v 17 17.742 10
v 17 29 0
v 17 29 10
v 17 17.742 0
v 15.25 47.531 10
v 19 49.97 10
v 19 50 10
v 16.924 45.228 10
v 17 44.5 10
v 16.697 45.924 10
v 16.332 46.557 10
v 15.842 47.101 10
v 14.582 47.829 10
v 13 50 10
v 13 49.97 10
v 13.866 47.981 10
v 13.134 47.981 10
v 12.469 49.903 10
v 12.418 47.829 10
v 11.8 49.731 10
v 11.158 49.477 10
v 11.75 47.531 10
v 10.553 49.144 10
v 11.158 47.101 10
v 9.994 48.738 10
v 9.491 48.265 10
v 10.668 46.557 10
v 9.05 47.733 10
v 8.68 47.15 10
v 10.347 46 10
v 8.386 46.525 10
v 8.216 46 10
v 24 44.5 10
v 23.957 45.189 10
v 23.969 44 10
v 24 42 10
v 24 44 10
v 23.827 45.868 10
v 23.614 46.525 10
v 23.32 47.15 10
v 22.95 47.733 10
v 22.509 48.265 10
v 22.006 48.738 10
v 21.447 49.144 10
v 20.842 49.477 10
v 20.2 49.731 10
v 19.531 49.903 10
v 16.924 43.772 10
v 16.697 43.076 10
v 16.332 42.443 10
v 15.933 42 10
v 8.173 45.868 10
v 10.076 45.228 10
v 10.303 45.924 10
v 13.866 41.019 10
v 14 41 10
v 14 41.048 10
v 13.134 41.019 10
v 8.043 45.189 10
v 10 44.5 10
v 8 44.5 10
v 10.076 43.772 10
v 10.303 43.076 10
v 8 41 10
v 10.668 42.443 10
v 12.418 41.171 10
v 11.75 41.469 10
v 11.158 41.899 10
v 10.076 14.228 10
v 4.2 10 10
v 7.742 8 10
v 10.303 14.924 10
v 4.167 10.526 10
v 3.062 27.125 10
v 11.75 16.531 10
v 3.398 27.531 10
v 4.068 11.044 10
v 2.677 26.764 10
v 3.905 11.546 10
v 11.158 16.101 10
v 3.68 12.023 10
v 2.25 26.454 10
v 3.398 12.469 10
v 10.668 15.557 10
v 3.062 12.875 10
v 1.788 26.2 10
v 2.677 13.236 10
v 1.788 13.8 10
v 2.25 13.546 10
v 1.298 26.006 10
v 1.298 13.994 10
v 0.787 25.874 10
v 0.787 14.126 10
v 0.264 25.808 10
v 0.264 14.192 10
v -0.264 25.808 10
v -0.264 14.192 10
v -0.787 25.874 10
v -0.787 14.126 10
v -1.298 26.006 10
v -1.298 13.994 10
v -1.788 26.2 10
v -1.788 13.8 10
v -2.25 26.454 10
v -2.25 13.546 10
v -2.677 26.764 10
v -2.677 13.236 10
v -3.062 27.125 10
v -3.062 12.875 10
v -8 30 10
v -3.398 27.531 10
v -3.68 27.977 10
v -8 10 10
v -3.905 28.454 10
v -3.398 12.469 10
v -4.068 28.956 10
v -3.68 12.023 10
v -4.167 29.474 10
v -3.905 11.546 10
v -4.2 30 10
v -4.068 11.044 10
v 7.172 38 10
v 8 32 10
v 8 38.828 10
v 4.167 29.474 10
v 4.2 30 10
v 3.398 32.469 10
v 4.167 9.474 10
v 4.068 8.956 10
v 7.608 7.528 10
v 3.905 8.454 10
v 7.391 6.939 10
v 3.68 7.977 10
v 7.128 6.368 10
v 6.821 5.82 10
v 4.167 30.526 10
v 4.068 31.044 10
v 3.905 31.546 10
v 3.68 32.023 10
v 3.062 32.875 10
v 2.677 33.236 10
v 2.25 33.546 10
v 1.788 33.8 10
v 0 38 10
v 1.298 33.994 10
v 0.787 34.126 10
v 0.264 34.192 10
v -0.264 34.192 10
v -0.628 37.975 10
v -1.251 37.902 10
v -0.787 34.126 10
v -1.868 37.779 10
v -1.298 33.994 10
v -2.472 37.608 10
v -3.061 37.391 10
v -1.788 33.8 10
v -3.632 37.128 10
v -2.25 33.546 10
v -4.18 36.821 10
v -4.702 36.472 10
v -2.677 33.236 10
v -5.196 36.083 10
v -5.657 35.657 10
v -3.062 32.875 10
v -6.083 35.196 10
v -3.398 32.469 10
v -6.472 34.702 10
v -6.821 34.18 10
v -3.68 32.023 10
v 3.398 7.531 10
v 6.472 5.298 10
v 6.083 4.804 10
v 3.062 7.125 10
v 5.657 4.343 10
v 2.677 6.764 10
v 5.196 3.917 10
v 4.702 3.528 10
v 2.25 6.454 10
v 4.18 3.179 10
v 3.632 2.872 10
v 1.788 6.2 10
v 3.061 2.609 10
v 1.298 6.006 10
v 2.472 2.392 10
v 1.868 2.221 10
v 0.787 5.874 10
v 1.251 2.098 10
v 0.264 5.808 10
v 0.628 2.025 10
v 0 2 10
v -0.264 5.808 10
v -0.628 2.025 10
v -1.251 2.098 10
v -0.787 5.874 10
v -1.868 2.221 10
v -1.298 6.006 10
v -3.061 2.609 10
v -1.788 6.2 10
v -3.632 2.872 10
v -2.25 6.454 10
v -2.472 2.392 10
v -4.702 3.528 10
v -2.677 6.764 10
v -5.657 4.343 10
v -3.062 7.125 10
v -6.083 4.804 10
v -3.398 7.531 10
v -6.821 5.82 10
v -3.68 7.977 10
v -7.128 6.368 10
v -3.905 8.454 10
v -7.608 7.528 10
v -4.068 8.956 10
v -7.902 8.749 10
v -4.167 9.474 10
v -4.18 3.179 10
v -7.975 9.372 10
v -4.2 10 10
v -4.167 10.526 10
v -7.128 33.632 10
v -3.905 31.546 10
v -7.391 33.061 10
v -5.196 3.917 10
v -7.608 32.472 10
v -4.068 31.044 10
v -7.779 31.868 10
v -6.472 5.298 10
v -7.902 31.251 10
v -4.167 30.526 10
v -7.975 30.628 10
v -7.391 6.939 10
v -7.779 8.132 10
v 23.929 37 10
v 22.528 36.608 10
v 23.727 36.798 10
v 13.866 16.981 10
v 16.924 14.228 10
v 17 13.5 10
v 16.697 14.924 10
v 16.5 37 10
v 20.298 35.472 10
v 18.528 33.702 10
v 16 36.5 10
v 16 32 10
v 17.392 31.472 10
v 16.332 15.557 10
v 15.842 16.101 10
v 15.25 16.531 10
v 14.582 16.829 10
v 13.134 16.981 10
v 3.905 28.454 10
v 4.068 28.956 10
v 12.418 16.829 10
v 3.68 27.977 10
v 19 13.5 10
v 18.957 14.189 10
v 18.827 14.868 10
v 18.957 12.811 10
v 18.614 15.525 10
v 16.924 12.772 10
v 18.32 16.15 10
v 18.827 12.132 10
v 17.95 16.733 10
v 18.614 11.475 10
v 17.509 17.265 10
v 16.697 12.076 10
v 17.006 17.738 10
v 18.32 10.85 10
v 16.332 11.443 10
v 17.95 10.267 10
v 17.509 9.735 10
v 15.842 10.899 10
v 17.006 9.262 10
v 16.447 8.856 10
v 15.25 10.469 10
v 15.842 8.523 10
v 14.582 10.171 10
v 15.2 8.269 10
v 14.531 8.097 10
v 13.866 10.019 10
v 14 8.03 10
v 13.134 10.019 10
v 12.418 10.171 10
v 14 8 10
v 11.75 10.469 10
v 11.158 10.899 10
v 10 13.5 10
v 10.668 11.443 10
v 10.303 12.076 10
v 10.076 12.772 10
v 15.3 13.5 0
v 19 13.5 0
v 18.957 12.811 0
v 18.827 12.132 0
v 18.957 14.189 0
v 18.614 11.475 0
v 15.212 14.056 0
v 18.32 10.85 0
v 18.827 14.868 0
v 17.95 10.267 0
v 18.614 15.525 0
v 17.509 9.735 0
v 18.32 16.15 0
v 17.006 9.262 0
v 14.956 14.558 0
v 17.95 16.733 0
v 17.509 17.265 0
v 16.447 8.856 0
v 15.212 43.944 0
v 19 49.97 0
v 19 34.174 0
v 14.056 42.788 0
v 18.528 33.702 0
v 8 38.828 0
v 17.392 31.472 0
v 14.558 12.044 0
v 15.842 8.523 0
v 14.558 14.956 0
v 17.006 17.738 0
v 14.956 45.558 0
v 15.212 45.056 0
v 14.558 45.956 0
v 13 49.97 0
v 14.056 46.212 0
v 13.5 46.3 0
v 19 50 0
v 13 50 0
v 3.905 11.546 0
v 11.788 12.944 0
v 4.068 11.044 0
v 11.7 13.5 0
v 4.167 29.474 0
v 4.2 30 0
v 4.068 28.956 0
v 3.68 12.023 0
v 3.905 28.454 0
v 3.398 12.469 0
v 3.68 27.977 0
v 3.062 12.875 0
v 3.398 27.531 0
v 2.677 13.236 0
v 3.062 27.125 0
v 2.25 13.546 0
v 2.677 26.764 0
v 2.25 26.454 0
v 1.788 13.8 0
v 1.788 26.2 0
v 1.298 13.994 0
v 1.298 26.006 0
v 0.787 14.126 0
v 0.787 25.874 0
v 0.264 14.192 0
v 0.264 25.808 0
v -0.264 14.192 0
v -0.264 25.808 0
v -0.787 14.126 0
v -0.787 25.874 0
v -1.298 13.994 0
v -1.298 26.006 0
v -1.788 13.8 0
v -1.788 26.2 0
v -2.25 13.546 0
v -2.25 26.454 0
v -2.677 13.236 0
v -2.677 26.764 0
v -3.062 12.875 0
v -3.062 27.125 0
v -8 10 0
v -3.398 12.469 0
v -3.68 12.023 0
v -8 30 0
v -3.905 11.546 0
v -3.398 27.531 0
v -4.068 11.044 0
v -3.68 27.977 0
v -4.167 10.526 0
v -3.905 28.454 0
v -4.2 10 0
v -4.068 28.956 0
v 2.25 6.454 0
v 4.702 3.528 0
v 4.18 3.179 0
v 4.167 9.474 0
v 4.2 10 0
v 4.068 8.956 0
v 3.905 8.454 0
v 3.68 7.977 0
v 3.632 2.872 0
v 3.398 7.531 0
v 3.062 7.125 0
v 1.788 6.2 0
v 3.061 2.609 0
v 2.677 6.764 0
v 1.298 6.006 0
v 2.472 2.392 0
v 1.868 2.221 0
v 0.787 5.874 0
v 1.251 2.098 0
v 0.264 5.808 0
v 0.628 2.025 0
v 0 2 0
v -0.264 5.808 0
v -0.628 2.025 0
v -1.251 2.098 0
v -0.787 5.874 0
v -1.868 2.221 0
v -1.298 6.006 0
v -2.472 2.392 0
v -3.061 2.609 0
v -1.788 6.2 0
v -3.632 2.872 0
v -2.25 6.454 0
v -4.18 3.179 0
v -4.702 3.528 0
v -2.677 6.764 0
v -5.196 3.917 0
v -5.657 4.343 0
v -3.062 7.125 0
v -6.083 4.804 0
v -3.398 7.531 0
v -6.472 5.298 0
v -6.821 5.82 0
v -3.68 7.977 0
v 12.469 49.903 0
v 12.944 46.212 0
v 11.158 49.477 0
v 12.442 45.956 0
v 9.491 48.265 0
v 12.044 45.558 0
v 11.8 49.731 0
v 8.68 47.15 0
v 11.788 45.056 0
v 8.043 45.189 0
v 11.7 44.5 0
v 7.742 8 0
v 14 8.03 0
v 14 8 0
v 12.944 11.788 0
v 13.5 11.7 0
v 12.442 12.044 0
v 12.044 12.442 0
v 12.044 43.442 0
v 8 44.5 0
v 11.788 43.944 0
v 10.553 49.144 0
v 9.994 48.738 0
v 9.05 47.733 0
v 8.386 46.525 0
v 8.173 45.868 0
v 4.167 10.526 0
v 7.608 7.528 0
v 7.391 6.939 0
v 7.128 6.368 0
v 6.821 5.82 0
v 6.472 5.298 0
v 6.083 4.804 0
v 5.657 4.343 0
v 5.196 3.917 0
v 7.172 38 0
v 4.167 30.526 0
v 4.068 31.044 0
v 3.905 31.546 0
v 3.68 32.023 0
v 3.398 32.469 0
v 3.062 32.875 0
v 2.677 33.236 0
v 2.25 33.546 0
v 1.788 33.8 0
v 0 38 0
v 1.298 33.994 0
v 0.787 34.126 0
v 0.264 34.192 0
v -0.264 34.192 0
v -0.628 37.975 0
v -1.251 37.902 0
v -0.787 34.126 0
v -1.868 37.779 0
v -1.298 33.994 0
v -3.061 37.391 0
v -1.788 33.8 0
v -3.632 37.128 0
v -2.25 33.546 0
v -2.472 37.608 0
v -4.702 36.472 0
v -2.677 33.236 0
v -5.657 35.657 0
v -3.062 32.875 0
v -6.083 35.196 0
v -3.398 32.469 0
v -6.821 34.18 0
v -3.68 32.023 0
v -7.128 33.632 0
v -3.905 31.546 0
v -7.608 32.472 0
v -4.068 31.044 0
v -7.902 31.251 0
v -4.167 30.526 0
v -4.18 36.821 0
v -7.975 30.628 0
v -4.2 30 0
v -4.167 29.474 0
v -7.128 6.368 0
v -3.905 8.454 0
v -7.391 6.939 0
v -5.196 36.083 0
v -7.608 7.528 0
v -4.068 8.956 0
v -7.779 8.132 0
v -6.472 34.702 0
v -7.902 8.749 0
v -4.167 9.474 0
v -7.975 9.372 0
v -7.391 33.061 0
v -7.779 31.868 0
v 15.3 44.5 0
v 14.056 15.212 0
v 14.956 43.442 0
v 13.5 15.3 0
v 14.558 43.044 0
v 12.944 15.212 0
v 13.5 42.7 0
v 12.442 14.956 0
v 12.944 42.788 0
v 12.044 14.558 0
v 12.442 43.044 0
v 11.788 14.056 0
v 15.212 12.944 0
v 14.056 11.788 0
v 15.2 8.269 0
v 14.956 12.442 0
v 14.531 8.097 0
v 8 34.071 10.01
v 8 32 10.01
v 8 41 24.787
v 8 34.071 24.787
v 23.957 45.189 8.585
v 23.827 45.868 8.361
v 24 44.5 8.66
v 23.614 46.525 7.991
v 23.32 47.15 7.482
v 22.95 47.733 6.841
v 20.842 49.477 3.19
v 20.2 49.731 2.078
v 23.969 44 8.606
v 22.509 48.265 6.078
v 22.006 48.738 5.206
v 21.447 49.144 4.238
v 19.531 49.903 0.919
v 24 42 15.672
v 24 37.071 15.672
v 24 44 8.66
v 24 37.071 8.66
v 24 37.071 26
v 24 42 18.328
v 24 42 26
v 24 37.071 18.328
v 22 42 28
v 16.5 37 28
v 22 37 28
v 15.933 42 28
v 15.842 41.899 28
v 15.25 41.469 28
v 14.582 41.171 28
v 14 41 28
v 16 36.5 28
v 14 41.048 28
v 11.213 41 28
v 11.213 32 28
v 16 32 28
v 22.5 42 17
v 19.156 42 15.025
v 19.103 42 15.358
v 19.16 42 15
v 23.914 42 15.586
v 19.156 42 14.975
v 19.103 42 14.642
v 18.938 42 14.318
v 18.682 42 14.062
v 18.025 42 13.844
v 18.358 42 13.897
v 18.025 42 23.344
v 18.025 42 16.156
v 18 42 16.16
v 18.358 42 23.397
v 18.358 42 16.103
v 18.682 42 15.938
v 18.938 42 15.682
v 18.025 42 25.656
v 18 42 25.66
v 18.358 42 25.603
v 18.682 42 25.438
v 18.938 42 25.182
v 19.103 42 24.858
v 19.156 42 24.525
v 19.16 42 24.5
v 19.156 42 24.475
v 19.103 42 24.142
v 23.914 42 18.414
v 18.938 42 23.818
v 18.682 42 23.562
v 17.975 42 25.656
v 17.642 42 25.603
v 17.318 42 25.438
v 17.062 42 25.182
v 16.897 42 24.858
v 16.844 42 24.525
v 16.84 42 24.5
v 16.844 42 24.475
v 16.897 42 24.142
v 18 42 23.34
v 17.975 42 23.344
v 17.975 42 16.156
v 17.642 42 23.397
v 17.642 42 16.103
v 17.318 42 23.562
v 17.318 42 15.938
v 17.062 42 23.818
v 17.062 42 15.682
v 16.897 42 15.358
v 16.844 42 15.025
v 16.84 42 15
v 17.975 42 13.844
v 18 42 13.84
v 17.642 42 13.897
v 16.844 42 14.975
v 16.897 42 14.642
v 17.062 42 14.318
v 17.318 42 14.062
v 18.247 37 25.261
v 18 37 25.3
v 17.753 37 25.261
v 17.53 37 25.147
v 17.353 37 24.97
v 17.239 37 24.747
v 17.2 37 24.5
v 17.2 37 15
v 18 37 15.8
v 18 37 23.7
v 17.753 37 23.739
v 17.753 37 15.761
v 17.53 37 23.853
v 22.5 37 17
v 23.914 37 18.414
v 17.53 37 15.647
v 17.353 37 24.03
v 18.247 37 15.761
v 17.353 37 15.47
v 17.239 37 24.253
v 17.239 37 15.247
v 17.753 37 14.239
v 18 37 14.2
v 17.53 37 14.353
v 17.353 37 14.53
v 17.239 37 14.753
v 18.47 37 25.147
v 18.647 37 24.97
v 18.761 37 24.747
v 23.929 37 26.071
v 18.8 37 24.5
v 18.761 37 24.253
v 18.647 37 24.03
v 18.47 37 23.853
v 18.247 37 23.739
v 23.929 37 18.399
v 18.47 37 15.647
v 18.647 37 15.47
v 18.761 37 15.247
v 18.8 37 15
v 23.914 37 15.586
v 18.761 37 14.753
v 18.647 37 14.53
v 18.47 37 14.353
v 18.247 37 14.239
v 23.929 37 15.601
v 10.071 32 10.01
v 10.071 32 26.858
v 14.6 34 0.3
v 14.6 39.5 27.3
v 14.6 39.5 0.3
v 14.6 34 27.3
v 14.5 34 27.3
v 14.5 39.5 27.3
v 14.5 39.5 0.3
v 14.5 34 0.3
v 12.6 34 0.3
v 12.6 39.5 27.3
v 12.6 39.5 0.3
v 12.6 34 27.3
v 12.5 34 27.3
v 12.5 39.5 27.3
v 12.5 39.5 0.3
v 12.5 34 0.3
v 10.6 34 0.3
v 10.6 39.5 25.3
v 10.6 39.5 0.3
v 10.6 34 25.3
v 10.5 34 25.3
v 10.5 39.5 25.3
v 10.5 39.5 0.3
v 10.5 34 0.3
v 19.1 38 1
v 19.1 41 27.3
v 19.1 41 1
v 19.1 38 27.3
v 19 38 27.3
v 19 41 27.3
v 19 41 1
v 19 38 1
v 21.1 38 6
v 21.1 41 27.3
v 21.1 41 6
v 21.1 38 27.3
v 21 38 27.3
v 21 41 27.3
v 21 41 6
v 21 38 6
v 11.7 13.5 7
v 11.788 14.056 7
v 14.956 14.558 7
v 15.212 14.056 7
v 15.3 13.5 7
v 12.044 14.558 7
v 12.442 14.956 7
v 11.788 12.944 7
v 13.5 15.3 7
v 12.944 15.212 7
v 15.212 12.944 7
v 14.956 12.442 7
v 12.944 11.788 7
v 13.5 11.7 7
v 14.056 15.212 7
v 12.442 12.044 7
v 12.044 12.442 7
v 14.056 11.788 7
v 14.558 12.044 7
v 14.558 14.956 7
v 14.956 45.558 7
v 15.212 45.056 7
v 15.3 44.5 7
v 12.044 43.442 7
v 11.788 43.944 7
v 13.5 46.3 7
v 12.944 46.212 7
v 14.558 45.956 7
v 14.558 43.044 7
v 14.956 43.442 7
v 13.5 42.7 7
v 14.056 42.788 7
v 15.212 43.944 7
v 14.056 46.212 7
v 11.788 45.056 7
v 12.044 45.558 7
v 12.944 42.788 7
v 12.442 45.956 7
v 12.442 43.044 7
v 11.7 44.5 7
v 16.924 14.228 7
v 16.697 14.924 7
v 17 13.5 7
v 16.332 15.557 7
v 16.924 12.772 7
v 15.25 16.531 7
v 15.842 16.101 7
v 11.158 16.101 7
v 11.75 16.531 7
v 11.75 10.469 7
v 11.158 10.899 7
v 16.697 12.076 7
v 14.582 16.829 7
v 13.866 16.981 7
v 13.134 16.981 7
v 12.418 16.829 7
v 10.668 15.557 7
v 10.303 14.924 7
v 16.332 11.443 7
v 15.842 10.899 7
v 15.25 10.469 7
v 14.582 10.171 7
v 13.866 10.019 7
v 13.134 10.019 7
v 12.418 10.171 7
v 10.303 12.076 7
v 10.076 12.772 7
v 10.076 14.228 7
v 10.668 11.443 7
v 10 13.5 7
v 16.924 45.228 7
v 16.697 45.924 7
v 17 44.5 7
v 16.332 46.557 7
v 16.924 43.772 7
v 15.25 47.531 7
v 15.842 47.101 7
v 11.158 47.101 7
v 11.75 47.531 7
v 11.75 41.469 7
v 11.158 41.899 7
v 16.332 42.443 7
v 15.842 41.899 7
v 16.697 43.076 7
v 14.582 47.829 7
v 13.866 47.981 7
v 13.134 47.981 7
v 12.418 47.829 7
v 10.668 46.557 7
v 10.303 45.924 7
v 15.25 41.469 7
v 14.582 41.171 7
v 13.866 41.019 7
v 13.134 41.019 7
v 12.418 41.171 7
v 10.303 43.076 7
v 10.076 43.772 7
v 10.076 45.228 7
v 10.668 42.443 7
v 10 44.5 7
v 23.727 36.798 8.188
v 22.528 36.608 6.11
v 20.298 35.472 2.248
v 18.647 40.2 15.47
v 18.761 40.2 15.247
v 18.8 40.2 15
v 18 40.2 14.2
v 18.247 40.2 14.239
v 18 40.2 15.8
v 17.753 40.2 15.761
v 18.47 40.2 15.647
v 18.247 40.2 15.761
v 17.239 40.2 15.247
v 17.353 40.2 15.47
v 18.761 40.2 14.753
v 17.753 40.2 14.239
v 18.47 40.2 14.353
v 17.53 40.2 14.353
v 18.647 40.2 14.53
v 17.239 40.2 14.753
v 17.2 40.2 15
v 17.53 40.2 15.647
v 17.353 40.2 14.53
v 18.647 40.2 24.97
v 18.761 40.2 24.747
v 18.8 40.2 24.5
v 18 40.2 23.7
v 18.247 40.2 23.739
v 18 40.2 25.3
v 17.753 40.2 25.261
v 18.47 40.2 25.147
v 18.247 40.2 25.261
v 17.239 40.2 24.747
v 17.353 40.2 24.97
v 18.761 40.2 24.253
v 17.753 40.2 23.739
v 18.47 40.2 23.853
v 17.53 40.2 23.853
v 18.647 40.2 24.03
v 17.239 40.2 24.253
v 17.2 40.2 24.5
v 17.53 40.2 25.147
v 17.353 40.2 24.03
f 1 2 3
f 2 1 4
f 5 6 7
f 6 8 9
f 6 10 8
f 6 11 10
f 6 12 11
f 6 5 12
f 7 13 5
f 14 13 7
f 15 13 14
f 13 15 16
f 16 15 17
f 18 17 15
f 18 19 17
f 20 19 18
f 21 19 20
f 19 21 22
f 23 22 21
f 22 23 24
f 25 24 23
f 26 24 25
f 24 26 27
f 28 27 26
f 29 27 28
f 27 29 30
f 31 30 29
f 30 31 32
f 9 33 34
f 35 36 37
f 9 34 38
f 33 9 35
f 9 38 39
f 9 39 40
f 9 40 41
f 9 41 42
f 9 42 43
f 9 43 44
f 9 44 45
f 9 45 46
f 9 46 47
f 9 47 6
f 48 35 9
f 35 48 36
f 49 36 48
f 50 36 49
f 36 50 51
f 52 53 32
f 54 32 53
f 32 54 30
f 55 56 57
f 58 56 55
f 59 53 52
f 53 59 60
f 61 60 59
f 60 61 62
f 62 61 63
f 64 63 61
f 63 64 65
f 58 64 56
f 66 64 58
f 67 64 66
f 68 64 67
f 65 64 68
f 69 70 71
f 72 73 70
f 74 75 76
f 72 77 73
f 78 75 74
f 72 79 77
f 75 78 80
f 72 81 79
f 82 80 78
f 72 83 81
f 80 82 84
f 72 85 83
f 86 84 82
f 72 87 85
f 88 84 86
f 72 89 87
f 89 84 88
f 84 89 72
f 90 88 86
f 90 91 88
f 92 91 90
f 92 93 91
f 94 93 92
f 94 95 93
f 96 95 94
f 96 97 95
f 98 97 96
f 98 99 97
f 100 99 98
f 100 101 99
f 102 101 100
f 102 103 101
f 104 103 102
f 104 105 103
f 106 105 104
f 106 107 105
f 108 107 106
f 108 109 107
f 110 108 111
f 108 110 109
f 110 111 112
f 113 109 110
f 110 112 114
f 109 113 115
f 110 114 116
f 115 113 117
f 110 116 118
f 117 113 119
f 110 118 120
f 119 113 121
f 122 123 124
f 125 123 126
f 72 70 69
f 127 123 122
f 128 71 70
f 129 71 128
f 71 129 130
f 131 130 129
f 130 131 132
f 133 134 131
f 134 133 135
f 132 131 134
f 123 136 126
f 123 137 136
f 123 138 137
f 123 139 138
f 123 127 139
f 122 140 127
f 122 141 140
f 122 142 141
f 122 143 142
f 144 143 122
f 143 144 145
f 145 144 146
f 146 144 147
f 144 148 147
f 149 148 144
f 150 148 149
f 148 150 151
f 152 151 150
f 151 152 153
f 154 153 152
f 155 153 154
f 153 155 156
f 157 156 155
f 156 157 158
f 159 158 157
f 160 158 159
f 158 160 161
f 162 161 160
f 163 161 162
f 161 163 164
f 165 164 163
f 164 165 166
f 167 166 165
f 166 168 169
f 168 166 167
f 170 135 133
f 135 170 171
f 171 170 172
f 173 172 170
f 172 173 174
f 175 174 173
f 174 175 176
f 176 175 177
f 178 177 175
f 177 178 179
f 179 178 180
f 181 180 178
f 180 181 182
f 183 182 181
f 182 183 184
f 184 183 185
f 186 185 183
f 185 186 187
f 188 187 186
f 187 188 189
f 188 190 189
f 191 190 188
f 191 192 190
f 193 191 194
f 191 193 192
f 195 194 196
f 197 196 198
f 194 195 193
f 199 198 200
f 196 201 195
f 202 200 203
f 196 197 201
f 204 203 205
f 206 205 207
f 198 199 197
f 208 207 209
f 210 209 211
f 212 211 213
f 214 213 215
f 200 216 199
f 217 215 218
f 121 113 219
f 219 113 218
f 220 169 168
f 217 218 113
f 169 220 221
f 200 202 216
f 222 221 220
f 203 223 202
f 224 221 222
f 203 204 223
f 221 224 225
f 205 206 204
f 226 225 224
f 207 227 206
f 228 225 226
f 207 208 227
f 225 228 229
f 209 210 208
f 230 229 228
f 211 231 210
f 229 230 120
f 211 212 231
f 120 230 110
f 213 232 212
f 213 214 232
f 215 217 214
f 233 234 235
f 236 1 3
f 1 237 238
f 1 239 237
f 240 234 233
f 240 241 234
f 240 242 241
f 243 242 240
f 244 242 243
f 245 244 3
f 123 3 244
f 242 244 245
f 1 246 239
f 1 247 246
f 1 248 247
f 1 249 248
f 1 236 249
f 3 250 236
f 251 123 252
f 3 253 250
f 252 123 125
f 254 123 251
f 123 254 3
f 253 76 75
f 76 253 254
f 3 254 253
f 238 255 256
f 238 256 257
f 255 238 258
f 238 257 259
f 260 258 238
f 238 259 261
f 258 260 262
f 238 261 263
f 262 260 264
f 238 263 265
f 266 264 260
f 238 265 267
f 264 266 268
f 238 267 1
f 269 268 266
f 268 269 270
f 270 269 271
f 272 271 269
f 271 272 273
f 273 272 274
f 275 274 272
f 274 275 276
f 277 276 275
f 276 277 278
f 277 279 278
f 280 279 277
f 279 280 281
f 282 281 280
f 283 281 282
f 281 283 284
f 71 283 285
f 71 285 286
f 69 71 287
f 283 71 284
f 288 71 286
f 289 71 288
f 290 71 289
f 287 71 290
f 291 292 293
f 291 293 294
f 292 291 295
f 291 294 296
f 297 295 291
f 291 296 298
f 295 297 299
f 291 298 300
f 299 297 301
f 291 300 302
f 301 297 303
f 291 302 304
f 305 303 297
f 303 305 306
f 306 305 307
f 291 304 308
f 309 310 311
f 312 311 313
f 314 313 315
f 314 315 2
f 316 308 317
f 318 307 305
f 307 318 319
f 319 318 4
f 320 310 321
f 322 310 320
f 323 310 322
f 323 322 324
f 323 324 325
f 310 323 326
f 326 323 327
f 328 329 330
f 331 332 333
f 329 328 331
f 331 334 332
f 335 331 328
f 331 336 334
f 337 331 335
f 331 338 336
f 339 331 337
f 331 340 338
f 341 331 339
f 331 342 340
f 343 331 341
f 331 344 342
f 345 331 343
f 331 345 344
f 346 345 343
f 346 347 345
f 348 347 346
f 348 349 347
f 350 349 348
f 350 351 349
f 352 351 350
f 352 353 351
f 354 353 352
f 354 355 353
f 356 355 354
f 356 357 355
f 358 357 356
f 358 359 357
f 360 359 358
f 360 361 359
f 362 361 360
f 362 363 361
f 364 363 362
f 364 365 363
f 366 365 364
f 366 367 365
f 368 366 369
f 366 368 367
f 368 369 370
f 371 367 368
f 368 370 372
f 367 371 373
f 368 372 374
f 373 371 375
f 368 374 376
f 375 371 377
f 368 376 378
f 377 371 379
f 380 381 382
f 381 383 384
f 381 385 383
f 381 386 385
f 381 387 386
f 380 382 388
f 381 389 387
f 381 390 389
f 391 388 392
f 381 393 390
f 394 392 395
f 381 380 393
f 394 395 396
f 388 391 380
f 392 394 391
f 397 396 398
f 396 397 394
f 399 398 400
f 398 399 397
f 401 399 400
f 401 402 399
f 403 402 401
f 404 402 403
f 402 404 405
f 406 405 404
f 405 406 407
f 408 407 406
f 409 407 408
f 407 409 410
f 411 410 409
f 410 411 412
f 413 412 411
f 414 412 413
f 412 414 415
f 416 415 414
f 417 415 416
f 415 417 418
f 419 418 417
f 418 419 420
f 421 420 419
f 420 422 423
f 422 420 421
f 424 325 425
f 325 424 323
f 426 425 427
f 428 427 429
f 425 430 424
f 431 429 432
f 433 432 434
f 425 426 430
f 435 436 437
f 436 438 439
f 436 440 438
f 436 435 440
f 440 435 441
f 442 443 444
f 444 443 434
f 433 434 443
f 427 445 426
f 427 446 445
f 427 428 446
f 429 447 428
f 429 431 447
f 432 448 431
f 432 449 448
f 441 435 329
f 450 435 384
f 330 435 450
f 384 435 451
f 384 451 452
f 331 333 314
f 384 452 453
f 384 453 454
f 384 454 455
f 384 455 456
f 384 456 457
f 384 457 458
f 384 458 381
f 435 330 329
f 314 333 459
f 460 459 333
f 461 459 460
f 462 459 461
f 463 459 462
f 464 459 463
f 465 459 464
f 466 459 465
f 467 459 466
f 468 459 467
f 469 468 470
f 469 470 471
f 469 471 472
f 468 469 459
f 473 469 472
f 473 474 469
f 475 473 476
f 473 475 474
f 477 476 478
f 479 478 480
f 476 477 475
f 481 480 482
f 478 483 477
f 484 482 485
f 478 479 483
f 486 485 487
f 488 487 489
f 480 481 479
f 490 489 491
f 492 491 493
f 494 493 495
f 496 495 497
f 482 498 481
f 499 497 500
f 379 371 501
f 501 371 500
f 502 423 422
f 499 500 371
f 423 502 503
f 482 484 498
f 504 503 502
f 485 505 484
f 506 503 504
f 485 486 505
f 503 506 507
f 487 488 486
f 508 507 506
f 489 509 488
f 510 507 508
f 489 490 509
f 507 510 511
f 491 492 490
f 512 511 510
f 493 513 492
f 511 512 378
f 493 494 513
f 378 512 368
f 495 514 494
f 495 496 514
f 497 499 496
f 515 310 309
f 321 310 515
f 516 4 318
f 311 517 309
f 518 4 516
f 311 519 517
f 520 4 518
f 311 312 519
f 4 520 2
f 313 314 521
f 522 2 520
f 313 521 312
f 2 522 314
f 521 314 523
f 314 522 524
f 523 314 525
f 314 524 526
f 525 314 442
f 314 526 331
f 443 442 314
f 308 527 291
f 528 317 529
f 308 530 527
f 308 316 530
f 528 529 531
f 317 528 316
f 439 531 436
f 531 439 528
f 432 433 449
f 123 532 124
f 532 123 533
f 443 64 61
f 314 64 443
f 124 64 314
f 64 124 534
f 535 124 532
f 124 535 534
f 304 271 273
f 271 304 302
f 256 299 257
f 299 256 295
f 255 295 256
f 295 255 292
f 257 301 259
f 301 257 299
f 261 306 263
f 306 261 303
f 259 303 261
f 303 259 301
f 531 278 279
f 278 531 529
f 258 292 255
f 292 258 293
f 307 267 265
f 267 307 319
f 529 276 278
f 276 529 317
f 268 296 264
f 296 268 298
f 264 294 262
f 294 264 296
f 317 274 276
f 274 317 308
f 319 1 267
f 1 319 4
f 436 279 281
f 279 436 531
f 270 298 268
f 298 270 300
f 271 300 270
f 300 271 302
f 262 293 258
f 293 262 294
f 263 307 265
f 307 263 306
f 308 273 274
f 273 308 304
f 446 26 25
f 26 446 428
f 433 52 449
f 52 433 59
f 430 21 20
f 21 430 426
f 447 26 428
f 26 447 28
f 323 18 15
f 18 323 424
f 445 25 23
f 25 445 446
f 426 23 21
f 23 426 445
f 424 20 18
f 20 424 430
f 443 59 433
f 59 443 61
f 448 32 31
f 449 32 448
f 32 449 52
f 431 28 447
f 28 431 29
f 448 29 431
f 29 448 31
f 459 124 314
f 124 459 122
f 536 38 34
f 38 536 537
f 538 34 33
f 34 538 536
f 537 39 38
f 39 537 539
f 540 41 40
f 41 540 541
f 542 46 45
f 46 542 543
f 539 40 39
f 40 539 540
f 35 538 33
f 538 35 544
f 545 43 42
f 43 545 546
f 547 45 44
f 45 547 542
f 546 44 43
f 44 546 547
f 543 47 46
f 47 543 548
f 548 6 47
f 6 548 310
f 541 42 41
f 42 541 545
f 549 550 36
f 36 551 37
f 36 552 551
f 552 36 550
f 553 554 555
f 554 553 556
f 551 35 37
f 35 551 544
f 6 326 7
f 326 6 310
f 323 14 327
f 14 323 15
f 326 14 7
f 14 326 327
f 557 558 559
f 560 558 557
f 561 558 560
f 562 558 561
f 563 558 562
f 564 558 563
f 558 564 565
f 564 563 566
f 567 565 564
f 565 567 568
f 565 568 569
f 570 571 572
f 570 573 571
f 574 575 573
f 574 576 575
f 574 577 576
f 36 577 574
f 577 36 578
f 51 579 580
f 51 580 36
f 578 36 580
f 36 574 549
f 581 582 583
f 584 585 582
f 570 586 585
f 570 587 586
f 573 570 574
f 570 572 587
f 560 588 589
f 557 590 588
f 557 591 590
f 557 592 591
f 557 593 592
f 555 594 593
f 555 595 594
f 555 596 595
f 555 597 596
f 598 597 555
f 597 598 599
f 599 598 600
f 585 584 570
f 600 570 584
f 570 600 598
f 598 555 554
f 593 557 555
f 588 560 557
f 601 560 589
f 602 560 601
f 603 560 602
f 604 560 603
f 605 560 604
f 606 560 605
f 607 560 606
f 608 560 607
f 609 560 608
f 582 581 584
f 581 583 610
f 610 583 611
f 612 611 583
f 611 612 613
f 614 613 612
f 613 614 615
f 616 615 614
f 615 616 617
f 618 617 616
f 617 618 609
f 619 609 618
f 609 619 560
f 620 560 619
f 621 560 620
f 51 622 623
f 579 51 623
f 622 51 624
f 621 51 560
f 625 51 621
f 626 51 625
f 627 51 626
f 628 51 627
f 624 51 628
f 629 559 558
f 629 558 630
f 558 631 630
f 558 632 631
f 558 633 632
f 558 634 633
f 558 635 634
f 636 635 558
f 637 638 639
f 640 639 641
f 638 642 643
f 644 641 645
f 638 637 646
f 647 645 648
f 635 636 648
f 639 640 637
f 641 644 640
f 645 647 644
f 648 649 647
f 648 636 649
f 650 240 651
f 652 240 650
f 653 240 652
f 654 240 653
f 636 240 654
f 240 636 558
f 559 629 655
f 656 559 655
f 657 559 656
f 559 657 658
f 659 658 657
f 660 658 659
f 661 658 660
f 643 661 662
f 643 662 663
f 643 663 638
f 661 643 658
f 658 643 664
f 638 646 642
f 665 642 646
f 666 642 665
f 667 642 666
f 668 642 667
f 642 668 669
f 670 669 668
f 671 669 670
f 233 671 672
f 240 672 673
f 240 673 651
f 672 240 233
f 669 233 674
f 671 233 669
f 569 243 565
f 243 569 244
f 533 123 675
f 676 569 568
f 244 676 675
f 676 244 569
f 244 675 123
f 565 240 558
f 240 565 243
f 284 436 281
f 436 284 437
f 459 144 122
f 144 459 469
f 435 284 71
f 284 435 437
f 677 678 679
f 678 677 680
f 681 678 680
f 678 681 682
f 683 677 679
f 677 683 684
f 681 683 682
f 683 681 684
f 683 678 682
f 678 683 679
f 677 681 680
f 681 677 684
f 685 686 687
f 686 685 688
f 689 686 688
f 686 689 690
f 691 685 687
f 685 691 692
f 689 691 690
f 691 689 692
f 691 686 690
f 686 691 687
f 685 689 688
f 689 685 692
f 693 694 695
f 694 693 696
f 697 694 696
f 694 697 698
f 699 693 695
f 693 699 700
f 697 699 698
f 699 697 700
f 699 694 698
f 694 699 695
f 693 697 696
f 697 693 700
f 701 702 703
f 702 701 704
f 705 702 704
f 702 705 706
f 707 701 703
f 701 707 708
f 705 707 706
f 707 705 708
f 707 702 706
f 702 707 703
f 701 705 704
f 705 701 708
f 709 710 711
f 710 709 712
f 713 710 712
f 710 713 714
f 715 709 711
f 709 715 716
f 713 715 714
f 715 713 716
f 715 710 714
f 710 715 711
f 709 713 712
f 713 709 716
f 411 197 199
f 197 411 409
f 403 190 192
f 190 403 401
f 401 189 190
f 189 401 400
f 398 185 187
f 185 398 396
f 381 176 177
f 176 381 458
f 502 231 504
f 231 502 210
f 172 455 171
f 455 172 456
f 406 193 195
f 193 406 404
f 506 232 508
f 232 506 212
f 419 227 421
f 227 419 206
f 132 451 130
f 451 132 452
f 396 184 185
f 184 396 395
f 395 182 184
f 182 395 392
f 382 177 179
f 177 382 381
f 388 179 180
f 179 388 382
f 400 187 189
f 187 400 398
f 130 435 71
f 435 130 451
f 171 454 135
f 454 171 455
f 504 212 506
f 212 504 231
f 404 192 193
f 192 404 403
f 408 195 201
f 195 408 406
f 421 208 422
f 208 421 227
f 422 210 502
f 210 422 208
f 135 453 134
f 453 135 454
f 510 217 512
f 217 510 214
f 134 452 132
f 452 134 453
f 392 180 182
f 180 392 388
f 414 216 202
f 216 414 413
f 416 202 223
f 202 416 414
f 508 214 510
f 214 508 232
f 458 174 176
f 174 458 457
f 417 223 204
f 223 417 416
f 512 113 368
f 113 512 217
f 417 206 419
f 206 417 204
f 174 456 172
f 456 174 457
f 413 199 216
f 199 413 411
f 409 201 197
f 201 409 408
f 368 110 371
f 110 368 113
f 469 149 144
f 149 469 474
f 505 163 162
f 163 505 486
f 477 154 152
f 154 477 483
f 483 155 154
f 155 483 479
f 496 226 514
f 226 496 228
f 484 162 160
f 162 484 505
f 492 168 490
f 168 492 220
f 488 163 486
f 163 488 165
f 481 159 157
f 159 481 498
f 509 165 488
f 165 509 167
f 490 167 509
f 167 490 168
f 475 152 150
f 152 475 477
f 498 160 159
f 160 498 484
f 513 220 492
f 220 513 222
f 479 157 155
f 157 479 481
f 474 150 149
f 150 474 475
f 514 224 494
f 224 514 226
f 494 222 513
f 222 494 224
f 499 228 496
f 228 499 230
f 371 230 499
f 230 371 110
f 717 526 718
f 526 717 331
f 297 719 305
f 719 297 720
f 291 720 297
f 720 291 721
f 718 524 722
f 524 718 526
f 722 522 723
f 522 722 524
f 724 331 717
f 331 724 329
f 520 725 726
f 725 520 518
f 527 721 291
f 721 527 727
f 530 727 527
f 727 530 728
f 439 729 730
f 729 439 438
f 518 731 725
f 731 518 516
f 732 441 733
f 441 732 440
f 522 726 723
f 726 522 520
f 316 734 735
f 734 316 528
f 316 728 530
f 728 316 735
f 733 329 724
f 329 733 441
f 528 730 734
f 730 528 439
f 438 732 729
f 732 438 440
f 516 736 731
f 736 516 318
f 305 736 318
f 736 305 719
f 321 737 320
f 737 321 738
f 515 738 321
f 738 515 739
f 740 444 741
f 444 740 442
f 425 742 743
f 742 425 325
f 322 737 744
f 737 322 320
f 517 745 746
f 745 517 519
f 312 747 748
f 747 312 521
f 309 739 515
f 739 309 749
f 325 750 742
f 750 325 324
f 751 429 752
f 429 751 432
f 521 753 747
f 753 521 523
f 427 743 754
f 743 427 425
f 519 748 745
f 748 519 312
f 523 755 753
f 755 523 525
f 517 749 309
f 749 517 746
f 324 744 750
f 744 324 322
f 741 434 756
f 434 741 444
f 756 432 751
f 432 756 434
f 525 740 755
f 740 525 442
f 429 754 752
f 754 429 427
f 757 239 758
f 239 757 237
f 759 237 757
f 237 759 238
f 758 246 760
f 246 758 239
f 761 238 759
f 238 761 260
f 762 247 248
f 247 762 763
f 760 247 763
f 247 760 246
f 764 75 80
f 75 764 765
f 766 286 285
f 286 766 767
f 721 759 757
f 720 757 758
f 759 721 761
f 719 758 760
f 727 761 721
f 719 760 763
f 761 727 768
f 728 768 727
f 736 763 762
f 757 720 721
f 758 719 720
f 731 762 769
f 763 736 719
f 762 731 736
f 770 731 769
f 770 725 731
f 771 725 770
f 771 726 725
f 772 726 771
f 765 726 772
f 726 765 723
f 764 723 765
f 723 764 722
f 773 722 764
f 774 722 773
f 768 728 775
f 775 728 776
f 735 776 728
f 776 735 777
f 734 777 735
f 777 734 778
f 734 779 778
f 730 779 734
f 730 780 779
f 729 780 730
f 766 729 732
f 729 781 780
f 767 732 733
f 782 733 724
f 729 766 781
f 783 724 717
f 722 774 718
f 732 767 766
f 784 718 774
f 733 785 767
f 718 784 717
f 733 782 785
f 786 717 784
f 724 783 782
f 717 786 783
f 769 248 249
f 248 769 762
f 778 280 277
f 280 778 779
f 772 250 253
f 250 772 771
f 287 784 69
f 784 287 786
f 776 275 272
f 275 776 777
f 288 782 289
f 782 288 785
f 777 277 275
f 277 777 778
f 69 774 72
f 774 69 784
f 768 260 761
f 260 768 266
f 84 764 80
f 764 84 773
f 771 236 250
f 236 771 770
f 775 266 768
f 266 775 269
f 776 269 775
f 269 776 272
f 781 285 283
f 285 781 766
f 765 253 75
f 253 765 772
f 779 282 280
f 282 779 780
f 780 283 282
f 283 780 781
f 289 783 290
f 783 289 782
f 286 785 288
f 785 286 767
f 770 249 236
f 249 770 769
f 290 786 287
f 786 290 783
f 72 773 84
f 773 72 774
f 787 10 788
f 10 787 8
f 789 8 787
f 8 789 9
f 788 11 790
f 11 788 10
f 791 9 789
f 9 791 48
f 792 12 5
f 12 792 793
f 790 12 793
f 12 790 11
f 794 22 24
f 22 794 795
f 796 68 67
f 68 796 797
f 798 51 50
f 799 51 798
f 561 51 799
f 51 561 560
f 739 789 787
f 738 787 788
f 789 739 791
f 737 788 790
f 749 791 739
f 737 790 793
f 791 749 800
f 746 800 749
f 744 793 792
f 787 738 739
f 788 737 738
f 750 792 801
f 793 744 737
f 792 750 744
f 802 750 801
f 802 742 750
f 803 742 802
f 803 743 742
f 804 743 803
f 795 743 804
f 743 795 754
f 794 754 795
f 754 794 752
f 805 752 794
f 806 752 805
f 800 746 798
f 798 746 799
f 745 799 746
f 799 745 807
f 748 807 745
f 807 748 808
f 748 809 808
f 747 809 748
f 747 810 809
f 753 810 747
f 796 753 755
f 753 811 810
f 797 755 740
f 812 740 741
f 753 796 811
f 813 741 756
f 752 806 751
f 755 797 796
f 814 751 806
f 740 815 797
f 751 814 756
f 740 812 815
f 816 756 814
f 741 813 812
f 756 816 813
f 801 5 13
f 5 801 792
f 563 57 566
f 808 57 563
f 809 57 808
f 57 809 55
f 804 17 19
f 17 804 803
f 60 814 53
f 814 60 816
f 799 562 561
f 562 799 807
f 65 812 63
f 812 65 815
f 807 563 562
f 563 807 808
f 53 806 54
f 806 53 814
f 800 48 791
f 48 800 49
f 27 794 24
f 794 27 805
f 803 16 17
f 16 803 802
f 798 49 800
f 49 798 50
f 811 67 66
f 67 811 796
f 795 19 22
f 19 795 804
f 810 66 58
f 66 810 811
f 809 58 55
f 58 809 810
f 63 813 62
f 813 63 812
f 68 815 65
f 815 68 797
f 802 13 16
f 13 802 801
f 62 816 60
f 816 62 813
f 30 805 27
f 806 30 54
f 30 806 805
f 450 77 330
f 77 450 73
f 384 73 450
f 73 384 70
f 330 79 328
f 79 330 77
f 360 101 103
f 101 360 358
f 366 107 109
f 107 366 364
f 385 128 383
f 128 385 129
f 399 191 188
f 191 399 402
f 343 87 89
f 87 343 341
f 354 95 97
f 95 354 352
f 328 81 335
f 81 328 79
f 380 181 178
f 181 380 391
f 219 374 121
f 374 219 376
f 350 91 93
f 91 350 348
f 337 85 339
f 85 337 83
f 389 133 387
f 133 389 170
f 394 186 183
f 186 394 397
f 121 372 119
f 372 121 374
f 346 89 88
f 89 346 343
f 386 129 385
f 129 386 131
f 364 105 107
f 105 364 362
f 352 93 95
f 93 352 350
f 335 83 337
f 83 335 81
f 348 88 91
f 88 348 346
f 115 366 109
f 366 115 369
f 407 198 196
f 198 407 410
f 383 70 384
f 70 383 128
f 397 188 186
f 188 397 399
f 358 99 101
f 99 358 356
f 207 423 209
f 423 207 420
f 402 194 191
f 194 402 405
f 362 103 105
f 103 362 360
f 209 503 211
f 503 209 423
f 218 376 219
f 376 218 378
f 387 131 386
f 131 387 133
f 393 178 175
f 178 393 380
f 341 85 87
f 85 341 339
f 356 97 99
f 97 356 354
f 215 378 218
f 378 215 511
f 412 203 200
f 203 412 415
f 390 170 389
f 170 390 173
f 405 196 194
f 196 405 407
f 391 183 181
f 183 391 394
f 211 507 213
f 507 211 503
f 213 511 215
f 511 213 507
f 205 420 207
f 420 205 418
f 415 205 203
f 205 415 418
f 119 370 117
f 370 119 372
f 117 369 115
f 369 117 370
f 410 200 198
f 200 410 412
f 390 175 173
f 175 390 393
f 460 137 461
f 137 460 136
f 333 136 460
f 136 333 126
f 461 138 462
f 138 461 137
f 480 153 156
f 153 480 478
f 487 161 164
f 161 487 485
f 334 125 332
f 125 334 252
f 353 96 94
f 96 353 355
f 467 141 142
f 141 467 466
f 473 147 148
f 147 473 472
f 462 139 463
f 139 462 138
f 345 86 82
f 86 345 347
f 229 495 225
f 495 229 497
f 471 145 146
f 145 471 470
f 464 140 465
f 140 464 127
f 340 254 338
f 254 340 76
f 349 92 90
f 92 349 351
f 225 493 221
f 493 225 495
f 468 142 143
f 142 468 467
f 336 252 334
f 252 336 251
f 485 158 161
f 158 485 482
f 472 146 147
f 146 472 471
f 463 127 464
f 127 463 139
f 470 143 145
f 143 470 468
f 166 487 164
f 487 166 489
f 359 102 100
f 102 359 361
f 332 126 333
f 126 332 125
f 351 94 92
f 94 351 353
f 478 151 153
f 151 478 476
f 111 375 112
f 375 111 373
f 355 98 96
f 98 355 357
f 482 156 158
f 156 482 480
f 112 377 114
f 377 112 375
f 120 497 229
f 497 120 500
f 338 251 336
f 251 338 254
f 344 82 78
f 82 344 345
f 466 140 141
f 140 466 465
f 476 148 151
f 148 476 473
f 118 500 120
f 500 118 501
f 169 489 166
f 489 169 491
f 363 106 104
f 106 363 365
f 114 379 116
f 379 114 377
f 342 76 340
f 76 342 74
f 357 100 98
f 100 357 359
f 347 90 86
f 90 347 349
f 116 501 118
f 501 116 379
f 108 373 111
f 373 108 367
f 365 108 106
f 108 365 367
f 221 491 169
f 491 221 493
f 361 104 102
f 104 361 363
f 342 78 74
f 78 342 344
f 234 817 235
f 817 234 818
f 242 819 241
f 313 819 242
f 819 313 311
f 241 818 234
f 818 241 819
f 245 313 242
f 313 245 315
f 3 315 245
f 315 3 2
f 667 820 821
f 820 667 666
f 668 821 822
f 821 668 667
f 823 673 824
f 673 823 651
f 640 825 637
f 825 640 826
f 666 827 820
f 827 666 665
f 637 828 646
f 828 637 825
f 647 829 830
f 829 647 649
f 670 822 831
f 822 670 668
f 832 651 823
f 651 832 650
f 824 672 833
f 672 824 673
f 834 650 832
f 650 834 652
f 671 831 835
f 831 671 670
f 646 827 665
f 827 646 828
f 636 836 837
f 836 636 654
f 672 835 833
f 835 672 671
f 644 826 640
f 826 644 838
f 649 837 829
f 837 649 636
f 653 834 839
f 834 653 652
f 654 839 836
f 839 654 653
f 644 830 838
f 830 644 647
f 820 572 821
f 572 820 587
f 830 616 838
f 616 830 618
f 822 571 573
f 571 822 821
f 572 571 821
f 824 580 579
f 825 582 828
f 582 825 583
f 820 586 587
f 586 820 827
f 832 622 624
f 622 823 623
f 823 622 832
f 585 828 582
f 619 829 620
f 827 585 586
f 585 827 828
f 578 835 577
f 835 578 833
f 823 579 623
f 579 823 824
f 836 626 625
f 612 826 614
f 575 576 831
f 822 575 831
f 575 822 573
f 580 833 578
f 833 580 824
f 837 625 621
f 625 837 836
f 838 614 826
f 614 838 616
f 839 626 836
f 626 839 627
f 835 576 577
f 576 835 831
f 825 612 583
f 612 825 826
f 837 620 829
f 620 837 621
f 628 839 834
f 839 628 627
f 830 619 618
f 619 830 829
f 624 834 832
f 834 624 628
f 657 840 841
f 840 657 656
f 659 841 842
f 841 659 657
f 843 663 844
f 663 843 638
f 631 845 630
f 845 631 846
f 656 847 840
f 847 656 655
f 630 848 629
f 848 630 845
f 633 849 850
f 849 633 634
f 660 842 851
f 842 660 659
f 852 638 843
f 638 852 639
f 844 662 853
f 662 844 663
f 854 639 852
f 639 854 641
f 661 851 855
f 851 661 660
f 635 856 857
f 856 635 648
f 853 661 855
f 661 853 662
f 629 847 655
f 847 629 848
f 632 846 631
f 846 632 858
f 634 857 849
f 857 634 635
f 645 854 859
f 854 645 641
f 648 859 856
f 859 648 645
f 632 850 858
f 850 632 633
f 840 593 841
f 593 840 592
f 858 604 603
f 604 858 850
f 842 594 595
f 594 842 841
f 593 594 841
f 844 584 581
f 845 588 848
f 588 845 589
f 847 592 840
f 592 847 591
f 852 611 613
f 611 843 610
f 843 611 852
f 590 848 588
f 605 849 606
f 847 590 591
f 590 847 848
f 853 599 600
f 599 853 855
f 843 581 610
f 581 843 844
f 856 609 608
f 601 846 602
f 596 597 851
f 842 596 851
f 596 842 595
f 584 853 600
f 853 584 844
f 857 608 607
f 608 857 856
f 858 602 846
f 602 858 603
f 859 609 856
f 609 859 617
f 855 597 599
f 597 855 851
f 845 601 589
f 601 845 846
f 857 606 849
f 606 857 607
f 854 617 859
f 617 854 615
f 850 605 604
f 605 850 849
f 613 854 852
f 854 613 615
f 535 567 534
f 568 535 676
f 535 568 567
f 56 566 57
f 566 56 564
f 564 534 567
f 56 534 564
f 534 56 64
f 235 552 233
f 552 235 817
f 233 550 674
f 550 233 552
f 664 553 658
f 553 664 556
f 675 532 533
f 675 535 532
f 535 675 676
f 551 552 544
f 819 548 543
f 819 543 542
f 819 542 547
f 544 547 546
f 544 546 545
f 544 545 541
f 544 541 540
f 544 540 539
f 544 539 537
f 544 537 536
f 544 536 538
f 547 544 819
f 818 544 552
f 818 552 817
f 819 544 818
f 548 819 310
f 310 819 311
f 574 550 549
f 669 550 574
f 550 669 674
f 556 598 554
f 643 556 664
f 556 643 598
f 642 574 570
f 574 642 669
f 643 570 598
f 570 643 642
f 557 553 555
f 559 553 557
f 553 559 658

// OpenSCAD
// PRUSA iteration3
// Y motor mount
// GNU GPL v3
// Josef Průša <iam@josefprusa.cz> and contributors
// http://www.reprap.org/wiki/Prusa_Mendel
// http://prusamendel.org

//include <configuration.scad>

module y_motor_base(){
    union(){
        // Motor holding part
        translate([29,-21+50,0]){

            difference(){
                union(){
                    translate([-21+4.5,0,5]) cube([9,31,10],center=true);
                    translate([-15.5,-15.5,0]) cylinder(h=10,r=5.5,$fn=50);
                    translate([-15.5,+15.5,0]) cylinder(h=10,r=5.5,$fn=50);
                    translate([-21,7,0]) rotate([0,0,45]) cube([2, 2, 10]);

                    // End stop
                    translate([-10.5,+15.5,0]) cylinder(h=10,r=5.5,$fn=50);
                    translate([-12,0,0]) cube([7,15,10]);
                    translate([-16,16,0]) cube([6,5,10]);
                    translate([-21+6,8,0]) cube([12-2,5,28]);
                    translate([-21,8-5,0]) cube([8,10,28]);
                    translate([-21+9.5-2,7,0]) rotate([0,0,45]) cube([2,2,28]);

                    // Joins motor holder and rod plate
                    translate([-29,-21,0]) cube([14,30,10]);
                }

                // Selective infill
                translate([-14.5,5,0.3]) cube([0.1,5.5,27]);
                translate([-16.5,5,0.3]) cube([0.1,5.5,27]);
                translate([-18.5,5,0.3]) cube([0.1,5.5,25]);
                translate([-10,9,1]) cube([0.1,3,26.3]);
                translate([-8,9,6]) cube([0.1,3,21.3]);

            }
        }
    }
    // Front holding part
    translate([0,10,0]) cylinder(h=10,r=8,$fn=80);
    translate([0,20,5]) cube([16,20,10],center=true);
    translate([0,30,0]) cylinder(h=10,r=8,$fn=80);
}

module y_motor_holes(){
    translate([29,-21+50,0]){

        // Screw head holes
        translate([-15.5,-15.5,-1]) cylinder(h=10,r=1.8,$fn=20);
        translate([-15.5,+15.5,-1]) cylinder(h=10,r=1.8,$fn=20);

        // Screw holes
        translate([-15.5,-15.5,7]) cylinder(h=7,r=3.5,$fn=30);
        translate([-15.5,+15.5,7]) cylinder(h=25,r=3.5,$fn=30);
    }
    translate([0,10,-1]) cylinder(h=12,r=4.2,$fn=50);
    translate([0,30,-1]) cylinder(h=12,r=4.2,$fn=50);

    // Endstop
    translate([25,29,0]) cylinder(h =29,r=8,$fn=20);

    translate([18,45,15]) rotate([90,0,0]) cylinder(h=10,r=0.8,$fn=20);
    translate([18,42.2,15]) rotate([90,0,0]) cylinder(h=2,r1=1.2,r2=0.8,$fn=20);

    translate([18,45,24.5]) rotate([90,0,0]) cylinder(h=10,r=0.8,$fn=20);
    translate([18,42.2,24.5]) rotate([90,0,0]) cylinder(h=2,r1=1.2,r2=0.8,$fn=20);

    // Endstop corner cutout
    translate([-10,30,28]) rotate([0,45,0]) cube([15,19,15]);
    translate([-1,41,10]) cube([15,5,19]);
    translate([27,33,0]) rotate([0,0,45]) cube([5,5,28]);
    translate([7,28,10.01]) rotate([0,0,45]) cube([5,5,28]);

    translate([19,32,0]) rotate([0,30,0]) cube([8,20,18]);
    translate([24.5-2,32,17]) rotate([0,45,0]) cube([2,20,2]);

    translate([23-2,32,29]) rotate([0,45,0]) cube([5,20,5]);
}

// Final part
module y_motor(){
    difference(){
        y_motor_base();
        y_motor_holes();
    }
}

y_motor();
